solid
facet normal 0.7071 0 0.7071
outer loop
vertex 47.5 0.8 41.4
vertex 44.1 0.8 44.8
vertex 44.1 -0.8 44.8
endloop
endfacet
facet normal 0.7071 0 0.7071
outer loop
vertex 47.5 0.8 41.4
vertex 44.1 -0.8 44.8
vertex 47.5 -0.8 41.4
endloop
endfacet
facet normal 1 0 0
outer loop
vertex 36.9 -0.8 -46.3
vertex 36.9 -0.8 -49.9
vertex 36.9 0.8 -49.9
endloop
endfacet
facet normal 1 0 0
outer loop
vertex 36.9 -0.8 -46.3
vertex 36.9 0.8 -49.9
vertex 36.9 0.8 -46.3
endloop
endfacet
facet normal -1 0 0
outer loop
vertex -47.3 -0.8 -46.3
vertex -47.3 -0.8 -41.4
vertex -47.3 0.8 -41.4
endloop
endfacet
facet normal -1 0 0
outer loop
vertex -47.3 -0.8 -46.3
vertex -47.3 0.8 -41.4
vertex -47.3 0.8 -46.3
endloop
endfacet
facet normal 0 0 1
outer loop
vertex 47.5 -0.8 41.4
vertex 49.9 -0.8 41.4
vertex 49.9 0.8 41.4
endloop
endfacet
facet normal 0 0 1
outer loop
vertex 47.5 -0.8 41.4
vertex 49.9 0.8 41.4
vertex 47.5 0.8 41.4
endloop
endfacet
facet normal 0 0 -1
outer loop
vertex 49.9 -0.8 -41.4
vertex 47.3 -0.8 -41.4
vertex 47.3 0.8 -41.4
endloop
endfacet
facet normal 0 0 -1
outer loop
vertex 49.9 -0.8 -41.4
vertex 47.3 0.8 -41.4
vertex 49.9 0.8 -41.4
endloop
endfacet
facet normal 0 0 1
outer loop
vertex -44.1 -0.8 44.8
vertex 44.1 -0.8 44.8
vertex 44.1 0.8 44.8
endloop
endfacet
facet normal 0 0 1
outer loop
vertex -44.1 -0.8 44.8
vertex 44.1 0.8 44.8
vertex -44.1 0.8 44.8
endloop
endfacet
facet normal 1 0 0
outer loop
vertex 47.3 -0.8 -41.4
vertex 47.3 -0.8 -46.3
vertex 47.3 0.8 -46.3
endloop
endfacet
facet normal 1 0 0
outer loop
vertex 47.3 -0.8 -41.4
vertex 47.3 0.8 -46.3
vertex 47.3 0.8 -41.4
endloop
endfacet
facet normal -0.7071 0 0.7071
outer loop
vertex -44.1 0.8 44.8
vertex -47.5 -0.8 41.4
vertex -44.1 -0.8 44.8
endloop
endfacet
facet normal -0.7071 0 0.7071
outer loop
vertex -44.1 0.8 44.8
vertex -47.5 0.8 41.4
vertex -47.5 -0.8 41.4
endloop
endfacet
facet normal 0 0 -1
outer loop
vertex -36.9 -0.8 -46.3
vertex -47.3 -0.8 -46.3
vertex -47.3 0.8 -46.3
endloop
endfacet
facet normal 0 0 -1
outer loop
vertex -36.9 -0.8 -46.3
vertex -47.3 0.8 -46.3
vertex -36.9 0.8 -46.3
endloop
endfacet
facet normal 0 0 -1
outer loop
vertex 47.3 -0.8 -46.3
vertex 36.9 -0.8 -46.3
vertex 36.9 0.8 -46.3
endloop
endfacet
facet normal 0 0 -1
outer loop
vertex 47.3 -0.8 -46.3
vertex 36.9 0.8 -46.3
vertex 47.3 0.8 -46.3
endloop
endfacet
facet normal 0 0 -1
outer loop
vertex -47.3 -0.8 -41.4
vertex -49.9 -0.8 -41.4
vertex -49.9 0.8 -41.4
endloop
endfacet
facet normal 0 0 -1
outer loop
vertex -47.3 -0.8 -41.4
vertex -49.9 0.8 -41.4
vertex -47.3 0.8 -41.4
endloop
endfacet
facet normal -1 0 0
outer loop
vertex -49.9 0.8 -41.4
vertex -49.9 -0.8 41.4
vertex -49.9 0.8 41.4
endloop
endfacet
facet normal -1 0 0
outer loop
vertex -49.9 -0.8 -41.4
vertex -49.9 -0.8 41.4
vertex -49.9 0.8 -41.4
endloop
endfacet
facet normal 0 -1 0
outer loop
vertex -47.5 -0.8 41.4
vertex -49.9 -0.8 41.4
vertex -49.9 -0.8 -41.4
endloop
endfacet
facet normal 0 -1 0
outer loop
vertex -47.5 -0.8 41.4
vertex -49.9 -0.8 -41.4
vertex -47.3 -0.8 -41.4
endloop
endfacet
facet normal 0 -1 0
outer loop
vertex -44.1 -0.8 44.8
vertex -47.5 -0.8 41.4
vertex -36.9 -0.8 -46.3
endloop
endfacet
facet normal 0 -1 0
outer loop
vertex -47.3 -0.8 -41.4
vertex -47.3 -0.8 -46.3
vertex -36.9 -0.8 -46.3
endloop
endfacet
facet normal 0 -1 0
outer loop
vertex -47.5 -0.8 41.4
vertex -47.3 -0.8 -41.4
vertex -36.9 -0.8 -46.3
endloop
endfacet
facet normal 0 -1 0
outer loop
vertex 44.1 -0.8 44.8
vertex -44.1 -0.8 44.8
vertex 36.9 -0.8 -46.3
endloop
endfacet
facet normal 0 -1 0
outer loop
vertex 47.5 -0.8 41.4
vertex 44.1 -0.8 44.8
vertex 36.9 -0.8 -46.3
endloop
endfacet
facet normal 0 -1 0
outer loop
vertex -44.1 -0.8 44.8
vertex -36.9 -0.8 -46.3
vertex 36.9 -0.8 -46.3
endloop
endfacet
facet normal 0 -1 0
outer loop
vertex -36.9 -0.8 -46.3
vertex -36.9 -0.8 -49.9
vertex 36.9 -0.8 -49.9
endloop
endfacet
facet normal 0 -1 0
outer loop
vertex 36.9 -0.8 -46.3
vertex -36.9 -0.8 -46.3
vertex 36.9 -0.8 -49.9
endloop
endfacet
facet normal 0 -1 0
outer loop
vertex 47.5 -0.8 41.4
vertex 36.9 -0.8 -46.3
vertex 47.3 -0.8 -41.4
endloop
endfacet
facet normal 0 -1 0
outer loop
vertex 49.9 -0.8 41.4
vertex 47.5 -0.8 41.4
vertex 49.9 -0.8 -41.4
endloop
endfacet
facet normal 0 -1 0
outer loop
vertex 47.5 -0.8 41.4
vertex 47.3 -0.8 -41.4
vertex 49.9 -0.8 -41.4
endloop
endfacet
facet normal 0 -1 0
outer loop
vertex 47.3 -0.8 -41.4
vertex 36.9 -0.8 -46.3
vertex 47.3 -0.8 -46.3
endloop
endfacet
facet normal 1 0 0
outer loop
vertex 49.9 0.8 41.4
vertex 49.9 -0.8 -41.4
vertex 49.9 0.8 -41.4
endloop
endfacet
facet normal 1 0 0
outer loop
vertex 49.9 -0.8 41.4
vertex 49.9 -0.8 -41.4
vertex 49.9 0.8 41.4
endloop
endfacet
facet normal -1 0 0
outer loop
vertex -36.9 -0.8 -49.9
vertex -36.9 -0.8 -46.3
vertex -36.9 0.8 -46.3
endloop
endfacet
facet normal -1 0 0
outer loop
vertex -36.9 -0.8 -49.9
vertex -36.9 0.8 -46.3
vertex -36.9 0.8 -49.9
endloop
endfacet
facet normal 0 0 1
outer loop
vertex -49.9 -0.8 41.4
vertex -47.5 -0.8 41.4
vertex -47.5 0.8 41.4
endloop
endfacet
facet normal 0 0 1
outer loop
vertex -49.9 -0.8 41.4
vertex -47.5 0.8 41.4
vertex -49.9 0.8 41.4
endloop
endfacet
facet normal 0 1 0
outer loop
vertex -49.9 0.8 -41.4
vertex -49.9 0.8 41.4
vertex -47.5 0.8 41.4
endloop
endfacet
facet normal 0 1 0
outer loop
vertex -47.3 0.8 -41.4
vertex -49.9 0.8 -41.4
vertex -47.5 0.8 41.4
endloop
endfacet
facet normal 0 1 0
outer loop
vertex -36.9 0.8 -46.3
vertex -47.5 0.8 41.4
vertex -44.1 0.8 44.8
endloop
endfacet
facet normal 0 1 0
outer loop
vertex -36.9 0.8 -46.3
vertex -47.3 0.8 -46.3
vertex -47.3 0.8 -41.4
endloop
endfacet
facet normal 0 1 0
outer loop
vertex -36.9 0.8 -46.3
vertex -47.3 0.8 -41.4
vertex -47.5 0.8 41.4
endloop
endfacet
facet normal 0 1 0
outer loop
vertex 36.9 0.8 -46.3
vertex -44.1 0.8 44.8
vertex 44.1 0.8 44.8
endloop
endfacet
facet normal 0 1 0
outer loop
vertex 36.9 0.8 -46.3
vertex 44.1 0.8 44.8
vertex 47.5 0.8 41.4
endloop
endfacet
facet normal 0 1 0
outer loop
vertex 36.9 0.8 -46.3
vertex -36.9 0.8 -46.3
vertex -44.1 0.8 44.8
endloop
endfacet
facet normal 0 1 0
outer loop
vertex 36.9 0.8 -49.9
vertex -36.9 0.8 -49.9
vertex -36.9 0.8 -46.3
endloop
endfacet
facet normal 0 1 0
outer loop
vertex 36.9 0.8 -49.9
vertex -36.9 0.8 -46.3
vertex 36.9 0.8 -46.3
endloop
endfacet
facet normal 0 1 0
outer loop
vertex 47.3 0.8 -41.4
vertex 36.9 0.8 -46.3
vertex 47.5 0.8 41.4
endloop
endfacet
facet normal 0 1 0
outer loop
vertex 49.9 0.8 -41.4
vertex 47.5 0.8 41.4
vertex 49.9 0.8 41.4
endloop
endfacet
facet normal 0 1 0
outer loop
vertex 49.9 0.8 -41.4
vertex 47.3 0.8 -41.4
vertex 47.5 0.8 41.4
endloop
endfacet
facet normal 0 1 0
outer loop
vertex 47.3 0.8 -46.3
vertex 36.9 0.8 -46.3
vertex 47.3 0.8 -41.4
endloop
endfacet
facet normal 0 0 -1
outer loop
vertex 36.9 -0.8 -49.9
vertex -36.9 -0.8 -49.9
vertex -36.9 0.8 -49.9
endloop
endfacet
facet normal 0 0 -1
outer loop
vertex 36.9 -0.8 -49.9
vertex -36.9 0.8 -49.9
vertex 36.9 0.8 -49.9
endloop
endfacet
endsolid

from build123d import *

# Parameters (mm, degrees)
BOSS_EXTRUDE1_DEPTH     = 0.8
ADDTOLERANCE_DEPTH      = 71.715203457
ADDTOLERANCE_DEPTH_BACK = 71.715203457
CUT_EXTRUDE1_DEPTH      = 71.573791169
CUT_EXTRUDE1_DEPTH_BACK = 71.573791169


with BuildPart() as part:
    # Sketch2 → Boss-Extrude1 (new, symmetric)
    with BuildSketch(Plane(origin=(0, 0, 0), x_dir=(1, 0, 0), z_dir=(0, 1, 0))):
        Polygon((41.5, -47.4), (47.4, -41.5), (50, -41.5), (50, 41.5), (47.4, 41.5), (47.4, 46.4), (37, 46.4), (37, 50), (-37, 50), (-37, 46.4), (-47.4, 46.4), (-47.4, 41.5), (-50, 41.5), (-50, -41.5), (-47.4, -41.5), (-41.5, -47.4), align=None)
    extrude(amount=BOSS_EXTRUDE1_DEPTH, both=True)

    # Sketch3 → AddTolerance (cut, two sides: drawn at the far end of the back side and taken through both)
    with BuildSketch(Plane(origin=(0, 0, 0), x_dir=(1, 0, 0), z_dir=(0, 1, 0)).offset(-ADDTOLERANCE_DEPTH_BACK)):
        Polygon((37, 50), (-37, 50), (-37, 46.4), (-47.4, 46.4), (-47.4, 41.5), (-50, 41.5), (-50, -41.5), (-47.4, -41.5), (-47.5, -41.4), (-49.9, -41.4), (-49.9, 41.4), (-47.3, 41.4), (-47.3, 46.3), (-36.9, 46.3), (-36.9, 49.9), (36.9, 49.9), (36.9, 46.3), (47.3, 46.3), (47.3, 41.4), (49.9, 41.4), (49.9, -41.4), (47.5, -41.4), (47.4, -41.5), (50, -41.5), (50, 41.5), (47.4, 41.5), (47.4, 46.4), (37, 46.4), align=None)
    extrude(amount=ADDTOLERANCE_DEPTH + ADDTOLERANCE_DEPTH_BACK, mode=Mode.SUBTRACT)

    # Sketch4 → Cut-Extrude1 (cut, two sides: drawn at the far end of the back side and taken through both)
    with BuildSketch(Plane(origin=(0, 0, 0), x_dir=(1, 0, 0), z_dir=(0, 1, 0)).offset(-CUT_EXTRUDE1_DEPTH_BACK)):
        Polygon((-41.5, -47.4), (41.5, -47.4), (43.1, -45.8), (-43.1, -45.8), align=None)
        Polygon((-43.1, -45.8), (43.1, -45.8), (44.1, -44.8), (-44.1, -44.8), align=None)
    extrude(amount=CUT_EXTRUDE1_DEPTH + CUT_EXTRUDE1_DEPTH_BACK, mode=Mode.SUBTRACT)


solid = part.part
